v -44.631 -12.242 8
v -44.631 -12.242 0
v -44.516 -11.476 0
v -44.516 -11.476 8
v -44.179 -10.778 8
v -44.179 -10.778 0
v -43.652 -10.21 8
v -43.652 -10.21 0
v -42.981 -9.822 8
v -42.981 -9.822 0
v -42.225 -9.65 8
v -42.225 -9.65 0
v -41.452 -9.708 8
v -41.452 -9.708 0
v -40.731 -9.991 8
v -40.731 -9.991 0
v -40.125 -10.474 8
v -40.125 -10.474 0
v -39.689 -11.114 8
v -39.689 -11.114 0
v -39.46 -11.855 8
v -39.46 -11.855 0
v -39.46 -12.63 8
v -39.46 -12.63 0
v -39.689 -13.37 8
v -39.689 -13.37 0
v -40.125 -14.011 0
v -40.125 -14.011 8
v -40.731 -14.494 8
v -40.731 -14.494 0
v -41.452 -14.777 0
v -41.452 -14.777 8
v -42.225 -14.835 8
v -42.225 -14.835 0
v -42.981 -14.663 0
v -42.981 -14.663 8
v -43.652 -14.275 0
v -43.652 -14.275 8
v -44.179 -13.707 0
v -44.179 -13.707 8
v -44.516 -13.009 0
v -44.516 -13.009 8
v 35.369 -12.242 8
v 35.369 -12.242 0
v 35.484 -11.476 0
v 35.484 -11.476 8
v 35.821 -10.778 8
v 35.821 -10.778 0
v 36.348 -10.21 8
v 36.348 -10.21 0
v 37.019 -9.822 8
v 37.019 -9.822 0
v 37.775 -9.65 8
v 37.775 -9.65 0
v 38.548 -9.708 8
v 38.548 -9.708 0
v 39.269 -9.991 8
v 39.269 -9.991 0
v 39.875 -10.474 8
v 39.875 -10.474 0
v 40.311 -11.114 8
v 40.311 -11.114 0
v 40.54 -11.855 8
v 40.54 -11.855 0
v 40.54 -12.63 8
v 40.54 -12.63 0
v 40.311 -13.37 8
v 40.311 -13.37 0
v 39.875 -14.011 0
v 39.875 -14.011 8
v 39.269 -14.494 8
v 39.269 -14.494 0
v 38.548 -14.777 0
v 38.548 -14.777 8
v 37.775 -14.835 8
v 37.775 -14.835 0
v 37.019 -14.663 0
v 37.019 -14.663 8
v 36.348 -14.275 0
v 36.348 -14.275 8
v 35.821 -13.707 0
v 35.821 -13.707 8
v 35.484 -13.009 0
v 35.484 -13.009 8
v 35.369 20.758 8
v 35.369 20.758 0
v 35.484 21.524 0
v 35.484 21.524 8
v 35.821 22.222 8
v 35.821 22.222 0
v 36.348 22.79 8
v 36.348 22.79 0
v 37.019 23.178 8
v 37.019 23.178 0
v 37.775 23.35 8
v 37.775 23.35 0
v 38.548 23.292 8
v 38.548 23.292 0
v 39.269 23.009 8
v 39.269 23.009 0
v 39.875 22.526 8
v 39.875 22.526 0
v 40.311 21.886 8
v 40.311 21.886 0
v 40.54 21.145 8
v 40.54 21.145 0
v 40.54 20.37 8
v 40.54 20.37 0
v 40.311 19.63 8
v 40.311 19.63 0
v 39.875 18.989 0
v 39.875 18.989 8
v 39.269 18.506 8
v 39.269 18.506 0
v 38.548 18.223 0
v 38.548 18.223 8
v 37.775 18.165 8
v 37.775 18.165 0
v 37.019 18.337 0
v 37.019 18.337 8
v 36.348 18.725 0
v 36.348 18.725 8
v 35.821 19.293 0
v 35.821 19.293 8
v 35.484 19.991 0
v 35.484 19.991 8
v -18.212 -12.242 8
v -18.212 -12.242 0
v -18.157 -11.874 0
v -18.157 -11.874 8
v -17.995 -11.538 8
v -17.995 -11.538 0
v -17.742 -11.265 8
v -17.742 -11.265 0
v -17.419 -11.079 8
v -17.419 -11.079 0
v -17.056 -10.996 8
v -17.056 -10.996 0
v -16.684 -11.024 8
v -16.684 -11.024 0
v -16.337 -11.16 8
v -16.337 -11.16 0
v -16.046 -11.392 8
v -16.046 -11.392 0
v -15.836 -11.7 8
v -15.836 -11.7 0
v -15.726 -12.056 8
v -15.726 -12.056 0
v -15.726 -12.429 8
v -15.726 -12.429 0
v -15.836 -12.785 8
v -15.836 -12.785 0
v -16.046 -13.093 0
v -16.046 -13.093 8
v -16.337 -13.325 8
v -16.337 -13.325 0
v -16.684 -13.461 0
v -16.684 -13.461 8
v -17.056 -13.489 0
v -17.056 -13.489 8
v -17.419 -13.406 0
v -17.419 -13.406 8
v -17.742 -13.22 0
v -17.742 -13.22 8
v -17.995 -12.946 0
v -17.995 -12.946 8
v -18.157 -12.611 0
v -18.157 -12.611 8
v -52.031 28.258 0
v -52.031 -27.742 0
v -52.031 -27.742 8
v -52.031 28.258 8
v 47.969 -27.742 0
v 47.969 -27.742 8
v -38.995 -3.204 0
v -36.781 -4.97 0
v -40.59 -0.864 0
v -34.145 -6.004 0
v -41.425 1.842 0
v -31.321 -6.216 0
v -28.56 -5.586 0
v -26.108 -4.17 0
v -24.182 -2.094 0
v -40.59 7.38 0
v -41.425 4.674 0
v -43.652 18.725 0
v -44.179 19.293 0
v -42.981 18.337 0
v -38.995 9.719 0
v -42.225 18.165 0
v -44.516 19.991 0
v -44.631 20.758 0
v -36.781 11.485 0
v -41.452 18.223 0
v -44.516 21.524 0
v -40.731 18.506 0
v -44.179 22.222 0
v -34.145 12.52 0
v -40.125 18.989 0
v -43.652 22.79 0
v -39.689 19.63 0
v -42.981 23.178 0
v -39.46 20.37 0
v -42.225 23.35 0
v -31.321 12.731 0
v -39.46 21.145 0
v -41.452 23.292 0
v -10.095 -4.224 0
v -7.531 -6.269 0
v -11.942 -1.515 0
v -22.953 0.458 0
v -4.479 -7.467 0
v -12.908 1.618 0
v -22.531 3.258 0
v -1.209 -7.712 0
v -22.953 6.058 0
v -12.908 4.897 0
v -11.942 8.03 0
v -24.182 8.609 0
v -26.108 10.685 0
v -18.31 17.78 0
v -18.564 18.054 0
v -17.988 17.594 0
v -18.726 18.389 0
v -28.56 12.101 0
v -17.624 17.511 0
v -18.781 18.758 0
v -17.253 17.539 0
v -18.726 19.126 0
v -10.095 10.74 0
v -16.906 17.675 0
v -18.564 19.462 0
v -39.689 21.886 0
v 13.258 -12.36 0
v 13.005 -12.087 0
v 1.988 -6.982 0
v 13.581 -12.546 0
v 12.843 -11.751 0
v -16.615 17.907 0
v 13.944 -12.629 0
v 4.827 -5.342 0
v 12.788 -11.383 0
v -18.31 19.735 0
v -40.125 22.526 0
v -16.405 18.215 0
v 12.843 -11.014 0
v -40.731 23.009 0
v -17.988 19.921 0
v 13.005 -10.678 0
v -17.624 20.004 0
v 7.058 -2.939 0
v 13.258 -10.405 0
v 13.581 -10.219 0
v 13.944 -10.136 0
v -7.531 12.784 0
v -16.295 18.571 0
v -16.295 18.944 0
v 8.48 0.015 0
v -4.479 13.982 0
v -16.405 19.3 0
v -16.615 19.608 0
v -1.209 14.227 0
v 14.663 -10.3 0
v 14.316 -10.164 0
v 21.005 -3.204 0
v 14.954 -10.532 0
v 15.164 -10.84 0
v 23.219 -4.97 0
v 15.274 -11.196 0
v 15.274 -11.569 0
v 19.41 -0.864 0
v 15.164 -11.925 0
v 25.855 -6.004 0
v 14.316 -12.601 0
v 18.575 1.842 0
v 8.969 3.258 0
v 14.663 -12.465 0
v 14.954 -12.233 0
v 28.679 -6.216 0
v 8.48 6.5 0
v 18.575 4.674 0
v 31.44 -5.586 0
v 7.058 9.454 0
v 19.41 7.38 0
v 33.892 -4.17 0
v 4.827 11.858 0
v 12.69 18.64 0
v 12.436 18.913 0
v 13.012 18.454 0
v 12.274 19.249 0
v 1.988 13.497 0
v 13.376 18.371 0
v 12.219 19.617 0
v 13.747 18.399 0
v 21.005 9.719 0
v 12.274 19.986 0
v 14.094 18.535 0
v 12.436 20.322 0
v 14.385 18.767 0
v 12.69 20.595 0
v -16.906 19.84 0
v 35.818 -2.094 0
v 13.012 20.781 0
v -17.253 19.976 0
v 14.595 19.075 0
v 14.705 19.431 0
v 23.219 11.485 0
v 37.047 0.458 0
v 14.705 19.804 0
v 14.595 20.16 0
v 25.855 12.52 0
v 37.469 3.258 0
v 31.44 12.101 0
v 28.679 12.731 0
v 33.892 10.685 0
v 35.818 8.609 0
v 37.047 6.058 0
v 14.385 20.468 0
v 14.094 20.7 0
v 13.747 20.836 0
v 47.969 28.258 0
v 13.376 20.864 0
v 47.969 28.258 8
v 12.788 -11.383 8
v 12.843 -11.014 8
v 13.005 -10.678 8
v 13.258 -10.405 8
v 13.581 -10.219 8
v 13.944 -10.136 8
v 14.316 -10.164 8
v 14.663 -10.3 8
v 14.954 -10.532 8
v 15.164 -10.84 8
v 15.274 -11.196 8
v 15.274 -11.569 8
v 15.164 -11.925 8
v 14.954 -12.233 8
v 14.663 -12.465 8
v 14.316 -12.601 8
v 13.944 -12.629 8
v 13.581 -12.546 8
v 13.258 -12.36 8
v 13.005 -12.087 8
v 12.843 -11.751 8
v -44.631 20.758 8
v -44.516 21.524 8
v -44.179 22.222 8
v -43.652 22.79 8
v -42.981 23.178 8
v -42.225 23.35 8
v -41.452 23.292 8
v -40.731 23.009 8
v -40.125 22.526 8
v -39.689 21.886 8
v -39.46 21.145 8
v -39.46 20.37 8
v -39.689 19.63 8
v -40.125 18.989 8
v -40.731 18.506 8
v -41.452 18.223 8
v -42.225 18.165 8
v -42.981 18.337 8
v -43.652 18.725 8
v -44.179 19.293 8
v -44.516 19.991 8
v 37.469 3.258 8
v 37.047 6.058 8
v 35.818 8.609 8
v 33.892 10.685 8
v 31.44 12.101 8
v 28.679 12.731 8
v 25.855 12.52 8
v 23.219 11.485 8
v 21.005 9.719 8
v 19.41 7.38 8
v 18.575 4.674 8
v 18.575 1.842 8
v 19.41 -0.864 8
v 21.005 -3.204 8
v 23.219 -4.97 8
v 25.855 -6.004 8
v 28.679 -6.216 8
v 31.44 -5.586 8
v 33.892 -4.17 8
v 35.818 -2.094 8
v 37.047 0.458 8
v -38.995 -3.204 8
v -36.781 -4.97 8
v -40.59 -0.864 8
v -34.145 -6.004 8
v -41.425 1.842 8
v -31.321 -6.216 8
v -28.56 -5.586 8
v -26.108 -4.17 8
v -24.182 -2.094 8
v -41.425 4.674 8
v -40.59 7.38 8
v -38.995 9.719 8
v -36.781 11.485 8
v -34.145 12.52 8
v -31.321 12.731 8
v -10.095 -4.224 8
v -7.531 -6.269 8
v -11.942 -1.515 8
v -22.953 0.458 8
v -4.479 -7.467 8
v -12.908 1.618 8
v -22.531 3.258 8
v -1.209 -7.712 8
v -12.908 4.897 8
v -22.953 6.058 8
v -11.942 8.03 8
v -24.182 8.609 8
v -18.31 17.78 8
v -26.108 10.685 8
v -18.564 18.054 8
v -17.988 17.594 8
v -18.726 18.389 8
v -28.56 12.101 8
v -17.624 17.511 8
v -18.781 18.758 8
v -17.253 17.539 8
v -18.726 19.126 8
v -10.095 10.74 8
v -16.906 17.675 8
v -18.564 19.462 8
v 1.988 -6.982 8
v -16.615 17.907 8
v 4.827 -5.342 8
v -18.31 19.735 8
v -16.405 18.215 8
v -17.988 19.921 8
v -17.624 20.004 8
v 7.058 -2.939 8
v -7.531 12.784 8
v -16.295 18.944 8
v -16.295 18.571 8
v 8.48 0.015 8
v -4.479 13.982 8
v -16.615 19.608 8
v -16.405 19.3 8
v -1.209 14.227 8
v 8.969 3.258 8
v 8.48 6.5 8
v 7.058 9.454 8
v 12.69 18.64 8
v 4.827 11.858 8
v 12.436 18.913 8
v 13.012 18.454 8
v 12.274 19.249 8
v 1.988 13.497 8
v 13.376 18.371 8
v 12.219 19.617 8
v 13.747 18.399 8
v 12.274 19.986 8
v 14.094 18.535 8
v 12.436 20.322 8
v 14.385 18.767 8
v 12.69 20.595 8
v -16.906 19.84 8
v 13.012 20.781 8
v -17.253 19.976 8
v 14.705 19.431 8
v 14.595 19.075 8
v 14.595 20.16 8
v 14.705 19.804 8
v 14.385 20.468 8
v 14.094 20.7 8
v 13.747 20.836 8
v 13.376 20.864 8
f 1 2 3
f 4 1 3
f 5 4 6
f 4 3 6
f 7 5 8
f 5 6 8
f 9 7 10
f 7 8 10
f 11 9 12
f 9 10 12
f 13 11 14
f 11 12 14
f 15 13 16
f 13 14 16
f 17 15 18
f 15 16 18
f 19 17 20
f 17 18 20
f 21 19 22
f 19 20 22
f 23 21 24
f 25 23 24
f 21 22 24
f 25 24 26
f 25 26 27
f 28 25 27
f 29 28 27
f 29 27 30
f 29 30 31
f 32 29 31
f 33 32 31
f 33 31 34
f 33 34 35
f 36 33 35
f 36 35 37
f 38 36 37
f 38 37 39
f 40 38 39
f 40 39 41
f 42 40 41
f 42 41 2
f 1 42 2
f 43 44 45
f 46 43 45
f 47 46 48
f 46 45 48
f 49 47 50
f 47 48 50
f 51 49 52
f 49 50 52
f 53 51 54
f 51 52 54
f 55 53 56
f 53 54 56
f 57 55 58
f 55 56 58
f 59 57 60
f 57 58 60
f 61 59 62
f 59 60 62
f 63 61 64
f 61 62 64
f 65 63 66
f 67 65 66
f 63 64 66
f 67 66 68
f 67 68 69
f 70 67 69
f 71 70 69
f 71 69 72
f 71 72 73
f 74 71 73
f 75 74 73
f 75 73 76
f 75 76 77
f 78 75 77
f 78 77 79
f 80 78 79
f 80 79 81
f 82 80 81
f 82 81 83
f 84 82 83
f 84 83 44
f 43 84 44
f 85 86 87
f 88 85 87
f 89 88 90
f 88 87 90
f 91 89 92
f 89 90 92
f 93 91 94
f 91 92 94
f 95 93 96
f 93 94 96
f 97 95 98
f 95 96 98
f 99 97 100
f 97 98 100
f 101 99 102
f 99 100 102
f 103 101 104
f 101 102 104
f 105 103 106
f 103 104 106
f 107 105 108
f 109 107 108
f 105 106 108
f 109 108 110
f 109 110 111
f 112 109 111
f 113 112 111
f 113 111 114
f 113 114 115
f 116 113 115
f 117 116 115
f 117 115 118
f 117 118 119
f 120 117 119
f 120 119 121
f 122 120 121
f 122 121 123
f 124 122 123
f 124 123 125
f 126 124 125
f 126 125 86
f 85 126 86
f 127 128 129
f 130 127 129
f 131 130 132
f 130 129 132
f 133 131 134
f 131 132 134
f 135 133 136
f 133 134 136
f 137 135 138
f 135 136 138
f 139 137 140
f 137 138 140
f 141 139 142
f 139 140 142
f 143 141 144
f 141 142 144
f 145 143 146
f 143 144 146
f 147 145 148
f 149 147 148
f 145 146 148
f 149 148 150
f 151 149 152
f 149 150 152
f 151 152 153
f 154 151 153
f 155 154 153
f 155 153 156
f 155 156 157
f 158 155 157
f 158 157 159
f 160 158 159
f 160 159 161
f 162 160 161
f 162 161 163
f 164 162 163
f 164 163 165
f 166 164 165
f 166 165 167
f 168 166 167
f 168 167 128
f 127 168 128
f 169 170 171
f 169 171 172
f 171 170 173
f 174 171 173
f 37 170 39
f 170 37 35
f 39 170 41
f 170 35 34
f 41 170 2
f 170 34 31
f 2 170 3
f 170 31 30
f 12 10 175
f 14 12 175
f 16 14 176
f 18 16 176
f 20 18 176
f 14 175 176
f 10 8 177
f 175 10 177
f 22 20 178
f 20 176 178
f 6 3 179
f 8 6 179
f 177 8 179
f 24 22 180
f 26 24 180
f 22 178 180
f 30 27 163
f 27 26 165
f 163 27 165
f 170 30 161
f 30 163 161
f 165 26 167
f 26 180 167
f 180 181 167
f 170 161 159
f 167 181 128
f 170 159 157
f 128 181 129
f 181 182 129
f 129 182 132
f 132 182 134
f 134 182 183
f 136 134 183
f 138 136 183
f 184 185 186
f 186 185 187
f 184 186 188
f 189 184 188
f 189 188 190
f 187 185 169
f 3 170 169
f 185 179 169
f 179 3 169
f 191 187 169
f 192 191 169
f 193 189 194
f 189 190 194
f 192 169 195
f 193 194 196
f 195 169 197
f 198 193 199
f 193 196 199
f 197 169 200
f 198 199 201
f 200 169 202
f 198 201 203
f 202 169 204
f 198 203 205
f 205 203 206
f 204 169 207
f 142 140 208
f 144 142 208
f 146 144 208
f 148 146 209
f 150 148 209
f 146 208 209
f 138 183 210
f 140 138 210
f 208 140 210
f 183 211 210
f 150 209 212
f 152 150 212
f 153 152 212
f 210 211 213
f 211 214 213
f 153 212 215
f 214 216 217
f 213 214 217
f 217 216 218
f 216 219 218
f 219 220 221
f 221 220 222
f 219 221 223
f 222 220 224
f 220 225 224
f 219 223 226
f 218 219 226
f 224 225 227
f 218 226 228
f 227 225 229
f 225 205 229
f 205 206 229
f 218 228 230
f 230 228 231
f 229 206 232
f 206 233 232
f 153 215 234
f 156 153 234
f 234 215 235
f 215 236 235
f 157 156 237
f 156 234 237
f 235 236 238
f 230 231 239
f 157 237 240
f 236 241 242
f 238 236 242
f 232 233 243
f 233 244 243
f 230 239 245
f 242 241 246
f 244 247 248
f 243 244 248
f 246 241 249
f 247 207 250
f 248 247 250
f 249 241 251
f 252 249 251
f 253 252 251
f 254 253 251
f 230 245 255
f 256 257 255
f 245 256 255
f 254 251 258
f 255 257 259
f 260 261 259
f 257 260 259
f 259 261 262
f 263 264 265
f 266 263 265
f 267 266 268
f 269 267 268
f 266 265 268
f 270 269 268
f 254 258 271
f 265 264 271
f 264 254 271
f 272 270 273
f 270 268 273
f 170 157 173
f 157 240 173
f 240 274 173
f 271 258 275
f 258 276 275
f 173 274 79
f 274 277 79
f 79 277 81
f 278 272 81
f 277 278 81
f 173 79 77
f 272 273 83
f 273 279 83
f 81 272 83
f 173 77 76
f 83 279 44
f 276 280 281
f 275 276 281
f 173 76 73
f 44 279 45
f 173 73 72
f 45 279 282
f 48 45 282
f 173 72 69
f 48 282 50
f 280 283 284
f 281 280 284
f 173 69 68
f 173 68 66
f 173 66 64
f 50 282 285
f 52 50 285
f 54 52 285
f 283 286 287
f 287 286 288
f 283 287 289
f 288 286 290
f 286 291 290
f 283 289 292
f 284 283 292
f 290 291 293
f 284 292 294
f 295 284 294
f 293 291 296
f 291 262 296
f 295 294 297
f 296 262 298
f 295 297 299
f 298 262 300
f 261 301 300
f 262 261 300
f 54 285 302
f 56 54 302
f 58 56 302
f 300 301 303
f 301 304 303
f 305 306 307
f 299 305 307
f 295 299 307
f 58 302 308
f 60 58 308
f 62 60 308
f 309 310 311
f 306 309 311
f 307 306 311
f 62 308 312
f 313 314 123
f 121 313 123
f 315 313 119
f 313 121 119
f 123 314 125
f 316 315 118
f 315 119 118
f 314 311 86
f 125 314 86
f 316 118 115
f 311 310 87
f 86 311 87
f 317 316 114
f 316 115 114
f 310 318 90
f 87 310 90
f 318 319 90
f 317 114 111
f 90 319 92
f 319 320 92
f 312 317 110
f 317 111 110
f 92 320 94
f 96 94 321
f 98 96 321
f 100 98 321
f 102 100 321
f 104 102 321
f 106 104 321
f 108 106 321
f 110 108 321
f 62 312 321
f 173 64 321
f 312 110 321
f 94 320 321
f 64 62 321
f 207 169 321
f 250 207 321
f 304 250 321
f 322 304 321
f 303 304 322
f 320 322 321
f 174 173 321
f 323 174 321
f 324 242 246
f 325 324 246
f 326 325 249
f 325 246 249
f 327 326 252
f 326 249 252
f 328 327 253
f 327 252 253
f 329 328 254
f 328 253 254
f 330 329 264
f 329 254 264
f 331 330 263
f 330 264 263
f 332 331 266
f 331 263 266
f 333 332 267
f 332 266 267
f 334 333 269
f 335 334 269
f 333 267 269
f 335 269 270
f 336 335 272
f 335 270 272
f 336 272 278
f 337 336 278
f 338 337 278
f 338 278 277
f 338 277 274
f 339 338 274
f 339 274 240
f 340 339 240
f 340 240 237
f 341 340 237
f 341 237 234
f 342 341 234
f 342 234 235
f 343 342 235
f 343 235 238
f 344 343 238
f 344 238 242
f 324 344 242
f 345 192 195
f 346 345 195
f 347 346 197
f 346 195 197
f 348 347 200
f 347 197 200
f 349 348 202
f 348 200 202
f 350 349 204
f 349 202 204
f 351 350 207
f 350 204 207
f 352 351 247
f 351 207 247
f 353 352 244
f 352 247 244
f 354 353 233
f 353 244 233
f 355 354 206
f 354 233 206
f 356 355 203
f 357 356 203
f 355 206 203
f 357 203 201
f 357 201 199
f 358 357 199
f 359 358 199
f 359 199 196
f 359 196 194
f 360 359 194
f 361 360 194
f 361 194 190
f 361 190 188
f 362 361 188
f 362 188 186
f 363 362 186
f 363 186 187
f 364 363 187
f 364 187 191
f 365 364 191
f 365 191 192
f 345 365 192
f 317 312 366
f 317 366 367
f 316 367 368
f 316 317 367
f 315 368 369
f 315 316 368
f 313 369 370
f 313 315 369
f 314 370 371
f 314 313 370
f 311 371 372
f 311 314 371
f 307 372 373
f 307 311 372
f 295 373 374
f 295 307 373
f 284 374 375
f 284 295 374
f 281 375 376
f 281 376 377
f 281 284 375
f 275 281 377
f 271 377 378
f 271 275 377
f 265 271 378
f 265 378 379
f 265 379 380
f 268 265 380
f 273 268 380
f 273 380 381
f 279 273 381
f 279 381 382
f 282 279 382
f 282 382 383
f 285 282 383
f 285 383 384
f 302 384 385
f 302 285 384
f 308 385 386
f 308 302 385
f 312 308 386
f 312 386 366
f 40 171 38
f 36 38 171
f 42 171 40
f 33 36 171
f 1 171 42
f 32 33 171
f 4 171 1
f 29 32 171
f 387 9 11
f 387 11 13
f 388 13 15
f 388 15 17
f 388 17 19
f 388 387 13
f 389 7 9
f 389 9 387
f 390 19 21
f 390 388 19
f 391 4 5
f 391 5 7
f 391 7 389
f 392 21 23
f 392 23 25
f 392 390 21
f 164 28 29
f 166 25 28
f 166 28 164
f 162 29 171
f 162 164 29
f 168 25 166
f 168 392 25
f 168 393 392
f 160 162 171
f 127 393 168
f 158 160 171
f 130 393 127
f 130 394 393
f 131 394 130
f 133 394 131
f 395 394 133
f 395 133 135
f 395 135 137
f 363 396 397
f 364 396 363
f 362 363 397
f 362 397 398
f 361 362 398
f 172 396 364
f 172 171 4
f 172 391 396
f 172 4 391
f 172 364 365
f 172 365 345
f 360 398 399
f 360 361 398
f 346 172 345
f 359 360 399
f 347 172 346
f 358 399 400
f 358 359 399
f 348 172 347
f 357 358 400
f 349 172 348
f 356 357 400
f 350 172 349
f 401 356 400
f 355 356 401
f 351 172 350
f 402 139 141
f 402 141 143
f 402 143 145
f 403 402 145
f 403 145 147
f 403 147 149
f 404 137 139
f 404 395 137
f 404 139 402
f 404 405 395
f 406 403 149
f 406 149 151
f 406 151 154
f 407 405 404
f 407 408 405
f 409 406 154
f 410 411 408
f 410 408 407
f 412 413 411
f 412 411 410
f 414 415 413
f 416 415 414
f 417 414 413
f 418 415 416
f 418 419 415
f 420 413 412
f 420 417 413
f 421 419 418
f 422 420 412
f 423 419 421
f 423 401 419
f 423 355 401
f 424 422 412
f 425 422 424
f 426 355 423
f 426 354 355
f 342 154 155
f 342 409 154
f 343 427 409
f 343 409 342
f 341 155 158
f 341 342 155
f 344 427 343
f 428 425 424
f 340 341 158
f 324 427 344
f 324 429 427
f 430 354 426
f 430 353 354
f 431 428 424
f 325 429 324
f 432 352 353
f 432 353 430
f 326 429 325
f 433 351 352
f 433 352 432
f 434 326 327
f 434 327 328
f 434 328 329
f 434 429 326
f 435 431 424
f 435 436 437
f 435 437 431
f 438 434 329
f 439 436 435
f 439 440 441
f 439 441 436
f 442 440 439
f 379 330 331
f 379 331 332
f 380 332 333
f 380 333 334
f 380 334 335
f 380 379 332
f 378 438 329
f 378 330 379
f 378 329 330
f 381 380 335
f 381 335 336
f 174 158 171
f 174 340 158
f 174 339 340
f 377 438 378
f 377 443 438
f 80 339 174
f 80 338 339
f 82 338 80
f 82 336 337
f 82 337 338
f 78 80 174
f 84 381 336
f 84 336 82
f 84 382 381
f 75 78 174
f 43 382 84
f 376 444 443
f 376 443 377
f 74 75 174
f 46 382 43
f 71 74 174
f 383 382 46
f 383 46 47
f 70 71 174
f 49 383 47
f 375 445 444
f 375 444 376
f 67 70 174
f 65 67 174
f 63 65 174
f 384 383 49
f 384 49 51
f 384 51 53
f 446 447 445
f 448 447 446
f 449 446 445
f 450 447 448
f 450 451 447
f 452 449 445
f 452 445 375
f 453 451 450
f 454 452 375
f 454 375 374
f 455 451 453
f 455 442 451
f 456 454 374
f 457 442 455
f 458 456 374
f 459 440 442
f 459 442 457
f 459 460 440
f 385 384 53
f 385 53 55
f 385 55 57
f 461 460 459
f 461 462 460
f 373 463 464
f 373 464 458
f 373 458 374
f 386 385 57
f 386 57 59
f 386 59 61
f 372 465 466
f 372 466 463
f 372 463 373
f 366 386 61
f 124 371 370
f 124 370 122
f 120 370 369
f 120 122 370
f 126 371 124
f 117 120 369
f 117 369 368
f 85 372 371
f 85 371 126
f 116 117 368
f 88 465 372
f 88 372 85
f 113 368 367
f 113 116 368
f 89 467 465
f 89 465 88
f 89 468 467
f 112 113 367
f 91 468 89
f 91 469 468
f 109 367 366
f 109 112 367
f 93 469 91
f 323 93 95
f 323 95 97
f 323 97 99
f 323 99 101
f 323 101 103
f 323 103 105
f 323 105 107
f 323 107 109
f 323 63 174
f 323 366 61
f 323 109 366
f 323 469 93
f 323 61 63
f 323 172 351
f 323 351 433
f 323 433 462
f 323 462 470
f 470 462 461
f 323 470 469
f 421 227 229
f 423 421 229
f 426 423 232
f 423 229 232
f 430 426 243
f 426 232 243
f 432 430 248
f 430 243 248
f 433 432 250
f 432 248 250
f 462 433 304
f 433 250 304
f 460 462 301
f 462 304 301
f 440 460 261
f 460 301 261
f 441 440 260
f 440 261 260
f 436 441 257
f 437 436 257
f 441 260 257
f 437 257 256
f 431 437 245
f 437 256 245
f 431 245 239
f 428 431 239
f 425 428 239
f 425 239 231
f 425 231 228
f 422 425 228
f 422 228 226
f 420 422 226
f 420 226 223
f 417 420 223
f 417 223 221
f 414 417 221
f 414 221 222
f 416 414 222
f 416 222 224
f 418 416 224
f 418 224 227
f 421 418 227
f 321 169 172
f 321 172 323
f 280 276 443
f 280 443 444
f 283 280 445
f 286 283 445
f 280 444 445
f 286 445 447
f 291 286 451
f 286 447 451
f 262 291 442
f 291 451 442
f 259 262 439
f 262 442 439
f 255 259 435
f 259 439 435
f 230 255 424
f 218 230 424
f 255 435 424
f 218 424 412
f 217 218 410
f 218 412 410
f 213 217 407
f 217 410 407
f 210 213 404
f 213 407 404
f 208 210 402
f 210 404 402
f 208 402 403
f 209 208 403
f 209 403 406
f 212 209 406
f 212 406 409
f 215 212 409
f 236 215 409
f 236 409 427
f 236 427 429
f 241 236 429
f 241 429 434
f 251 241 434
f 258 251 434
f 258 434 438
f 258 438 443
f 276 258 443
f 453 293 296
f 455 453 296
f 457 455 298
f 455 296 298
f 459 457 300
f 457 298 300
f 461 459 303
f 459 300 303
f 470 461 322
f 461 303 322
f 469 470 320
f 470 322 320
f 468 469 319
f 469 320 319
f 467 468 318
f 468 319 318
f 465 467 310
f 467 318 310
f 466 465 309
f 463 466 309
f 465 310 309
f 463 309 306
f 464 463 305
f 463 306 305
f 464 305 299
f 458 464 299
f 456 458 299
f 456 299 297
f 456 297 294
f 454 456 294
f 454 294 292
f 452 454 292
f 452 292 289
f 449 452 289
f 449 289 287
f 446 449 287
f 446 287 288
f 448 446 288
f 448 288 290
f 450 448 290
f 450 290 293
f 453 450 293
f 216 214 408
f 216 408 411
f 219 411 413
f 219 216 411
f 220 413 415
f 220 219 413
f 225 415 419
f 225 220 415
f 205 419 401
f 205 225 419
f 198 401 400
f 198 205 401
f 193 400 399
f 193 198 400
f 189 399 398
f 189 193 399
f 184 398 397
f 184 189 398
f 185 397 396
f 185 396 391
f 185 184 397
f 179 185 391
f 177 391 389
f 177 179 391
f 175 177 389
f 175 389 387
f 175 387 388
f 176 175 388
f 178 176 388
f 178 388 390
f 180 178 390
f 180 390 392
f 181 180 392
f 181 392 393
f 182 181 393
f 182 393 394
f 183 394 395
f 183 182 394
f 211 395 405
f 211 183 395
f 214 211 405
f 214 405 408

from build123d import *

# Parameters (mm, degrees)
IZIM1_W                              = 100
IZIM1_H                              = 56
IZIM1_R                              = 9.5
IZIM1_R_2                            = 2.031053151
Y_KSEKLIK_EKSTR_ZYON1_DEPTH          = 8
IZIM2_R                              = 11
KES_EKSTR_ZYON1_DEPTH                = 10
IZIM3_R                              = 1.25
KES_EKSTR_ZYON2_DEPTH                = 10
M5_HELISARMAL_I_IN_Z_VANA_MATKAB_1_D = 5.2


with BuildPart() as part:
    # Çizim1 → Yükseklik-Ekstrüzyon1 (new body)
    with BuildSketch(Plane.XY):
        with Locations((-2.031053151, 0.257686676)):
            Rectangle(IZIM1_W, IZIM1_H)
        with Locations((-32.031053151, 3.257686676)):
            Circle(IZIM1_R, mode=Mode.SUBTRACT)
        with Locations((27.968946849, 3.257686676)):
            Circle(IZIM1_R, mode=Mode.SUBTRACT)
        with Locations((-2.031053151, 3.257686676)):
            Circle(IZIM1_R_2, mode=Mode.SUBTRACT)
    extrude(amount=Y_KSEKLIK_EKSTR_ZYON1_DEPTH)

    # Çizim2 → Kes-Ekstrüzyon1 (cut)
    with BuildSketch(Plane.XY.offset(8)):
        with Locations((-2.031053151, 3.257686676)):
            Circle(IZIM2_R)
    extrude(amount=-KES_EKSTR_ZYON1_DEPTH, mode=Mode.SUBTRACT)

    # Çizim3 → Kes-Ekstrüzyon2 (cut)
    with BuildSketch(Plane(origin=(0, 0, 0), x_dir=(-1, 0, 0), z_dir=(0, 0, -1))):
        with Locations((-13.468946849, 19.617369517)):
            Circle(IZIM3_R)
        with Locations((17.531053151, 18.757686676)):
            Circle(IZIM3_R)
        with Locations((16.962368033, -12.242313324)):
            Circle(IZIM3_R)
        with Locations((-14.037631967, -11.382630483)):
            Circle(IZIM3_R)
    extrude(amount=-KES_EKSTR_ZYON2_DEPTH, mode=Mode.SUBTRACT)

    # M5 Helisarmal için Zıvana matkabı1 (through all)
    with Locations(Plane(origin=(-42.031053151, 20.757686676, 8), x_dir=(1, 0, 0), z_dir=(0, 0, 1))):
        with Locations((0, 0), (80, 0), (80, -33), (0, -33)):
            Hole(M5_HELISARMAL_I_IN_Z_VANA_MATKAB_1_D / 2)


solid = part.part
